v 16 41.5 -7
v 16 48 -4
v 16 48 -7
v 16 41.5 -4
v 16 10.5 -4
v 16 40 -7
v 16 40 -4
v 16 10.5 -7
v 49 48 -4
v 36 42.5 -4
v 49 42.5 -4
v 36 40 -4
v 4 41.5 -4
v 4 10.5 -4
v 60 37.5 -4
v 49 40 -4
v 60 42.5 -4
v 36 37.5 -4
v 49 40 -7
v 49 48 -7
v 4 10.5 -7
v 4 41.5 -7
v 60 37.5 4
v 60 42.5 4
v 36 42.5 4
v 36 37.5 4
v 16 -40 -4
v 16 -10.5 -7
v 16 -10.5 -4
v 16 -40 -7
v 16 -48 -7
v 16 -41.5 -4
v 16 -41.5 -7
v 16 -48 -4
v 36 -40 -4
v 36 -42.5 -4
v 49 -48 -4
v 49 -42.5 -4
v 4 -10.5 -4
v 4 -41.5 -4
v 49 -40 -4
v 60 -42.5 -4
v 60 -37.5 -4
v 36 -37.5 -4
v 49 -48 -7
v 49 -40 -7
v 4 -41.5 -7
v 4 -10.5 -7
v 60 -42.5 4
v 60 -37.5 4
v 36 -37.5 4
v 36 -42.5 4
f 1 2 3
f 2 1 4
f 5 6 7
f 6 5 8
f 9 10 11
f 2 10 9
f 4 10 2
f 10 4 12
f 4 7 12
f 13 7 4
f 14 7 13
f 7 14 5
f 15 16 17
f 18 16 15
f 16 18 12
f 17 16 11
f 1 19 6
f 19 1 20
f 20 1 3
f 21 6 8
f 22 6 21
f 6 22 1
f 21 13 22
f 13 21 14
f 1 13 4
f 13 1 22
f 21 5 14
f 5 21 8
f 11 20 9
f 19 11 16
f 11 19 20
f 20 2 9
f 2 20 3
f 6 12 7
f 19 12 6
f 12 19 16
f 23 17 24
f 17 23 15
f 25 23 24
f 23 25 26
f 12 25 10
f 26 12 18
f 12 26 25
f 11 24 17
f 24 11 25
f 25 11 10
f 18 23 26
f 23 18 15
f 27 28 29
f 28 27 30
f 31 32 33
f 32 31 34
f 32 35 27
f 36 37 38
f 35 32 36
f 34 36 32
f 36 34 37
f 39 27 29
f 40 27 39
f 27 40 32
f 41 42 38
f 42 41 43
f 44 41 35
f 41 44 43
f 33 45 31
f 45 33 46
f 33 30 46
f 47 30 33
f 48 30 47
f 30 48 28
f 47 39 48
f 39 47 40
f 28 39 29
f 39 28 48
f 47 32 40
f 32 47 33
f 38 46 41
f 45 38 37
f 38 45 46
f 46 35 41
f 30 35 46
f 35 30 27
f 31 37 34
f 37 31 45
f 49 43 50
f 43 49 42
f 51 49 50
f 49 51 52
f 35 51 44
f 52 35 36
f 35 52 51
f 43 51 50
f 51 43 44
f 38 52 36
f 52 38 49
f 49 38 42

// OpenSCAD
echo("CONCEPT ONLY: no shaft/horn holes, retention, tolerance or strength release");
echo("Units mm. Neutral/open pose. Pads are contact references, not printed PA12.");
color("orange") translate([10.0, 26.0, -5.5]) cube([12.0, 31.0, 3.0], center=true);
color("orange") translate([32.5, 44.0, -5.5]) cube([33.0, 8.0, 3.0], center=true);
color("green") translate([48.0, 40.0, 0]) cube([24, 5, 8], center=true);
color("orange") translate([10.0, -26.0, -5.5]) cube([12.0, 31.0, 3.0], center=true);
color("orange") translate([32.5, -44.0, -5.5]) cube([33.0, 8.0, 3.0], center=true);
color("green") translate([48.0, -40.0, 0]) cube([24, 5, 8], center=true);
